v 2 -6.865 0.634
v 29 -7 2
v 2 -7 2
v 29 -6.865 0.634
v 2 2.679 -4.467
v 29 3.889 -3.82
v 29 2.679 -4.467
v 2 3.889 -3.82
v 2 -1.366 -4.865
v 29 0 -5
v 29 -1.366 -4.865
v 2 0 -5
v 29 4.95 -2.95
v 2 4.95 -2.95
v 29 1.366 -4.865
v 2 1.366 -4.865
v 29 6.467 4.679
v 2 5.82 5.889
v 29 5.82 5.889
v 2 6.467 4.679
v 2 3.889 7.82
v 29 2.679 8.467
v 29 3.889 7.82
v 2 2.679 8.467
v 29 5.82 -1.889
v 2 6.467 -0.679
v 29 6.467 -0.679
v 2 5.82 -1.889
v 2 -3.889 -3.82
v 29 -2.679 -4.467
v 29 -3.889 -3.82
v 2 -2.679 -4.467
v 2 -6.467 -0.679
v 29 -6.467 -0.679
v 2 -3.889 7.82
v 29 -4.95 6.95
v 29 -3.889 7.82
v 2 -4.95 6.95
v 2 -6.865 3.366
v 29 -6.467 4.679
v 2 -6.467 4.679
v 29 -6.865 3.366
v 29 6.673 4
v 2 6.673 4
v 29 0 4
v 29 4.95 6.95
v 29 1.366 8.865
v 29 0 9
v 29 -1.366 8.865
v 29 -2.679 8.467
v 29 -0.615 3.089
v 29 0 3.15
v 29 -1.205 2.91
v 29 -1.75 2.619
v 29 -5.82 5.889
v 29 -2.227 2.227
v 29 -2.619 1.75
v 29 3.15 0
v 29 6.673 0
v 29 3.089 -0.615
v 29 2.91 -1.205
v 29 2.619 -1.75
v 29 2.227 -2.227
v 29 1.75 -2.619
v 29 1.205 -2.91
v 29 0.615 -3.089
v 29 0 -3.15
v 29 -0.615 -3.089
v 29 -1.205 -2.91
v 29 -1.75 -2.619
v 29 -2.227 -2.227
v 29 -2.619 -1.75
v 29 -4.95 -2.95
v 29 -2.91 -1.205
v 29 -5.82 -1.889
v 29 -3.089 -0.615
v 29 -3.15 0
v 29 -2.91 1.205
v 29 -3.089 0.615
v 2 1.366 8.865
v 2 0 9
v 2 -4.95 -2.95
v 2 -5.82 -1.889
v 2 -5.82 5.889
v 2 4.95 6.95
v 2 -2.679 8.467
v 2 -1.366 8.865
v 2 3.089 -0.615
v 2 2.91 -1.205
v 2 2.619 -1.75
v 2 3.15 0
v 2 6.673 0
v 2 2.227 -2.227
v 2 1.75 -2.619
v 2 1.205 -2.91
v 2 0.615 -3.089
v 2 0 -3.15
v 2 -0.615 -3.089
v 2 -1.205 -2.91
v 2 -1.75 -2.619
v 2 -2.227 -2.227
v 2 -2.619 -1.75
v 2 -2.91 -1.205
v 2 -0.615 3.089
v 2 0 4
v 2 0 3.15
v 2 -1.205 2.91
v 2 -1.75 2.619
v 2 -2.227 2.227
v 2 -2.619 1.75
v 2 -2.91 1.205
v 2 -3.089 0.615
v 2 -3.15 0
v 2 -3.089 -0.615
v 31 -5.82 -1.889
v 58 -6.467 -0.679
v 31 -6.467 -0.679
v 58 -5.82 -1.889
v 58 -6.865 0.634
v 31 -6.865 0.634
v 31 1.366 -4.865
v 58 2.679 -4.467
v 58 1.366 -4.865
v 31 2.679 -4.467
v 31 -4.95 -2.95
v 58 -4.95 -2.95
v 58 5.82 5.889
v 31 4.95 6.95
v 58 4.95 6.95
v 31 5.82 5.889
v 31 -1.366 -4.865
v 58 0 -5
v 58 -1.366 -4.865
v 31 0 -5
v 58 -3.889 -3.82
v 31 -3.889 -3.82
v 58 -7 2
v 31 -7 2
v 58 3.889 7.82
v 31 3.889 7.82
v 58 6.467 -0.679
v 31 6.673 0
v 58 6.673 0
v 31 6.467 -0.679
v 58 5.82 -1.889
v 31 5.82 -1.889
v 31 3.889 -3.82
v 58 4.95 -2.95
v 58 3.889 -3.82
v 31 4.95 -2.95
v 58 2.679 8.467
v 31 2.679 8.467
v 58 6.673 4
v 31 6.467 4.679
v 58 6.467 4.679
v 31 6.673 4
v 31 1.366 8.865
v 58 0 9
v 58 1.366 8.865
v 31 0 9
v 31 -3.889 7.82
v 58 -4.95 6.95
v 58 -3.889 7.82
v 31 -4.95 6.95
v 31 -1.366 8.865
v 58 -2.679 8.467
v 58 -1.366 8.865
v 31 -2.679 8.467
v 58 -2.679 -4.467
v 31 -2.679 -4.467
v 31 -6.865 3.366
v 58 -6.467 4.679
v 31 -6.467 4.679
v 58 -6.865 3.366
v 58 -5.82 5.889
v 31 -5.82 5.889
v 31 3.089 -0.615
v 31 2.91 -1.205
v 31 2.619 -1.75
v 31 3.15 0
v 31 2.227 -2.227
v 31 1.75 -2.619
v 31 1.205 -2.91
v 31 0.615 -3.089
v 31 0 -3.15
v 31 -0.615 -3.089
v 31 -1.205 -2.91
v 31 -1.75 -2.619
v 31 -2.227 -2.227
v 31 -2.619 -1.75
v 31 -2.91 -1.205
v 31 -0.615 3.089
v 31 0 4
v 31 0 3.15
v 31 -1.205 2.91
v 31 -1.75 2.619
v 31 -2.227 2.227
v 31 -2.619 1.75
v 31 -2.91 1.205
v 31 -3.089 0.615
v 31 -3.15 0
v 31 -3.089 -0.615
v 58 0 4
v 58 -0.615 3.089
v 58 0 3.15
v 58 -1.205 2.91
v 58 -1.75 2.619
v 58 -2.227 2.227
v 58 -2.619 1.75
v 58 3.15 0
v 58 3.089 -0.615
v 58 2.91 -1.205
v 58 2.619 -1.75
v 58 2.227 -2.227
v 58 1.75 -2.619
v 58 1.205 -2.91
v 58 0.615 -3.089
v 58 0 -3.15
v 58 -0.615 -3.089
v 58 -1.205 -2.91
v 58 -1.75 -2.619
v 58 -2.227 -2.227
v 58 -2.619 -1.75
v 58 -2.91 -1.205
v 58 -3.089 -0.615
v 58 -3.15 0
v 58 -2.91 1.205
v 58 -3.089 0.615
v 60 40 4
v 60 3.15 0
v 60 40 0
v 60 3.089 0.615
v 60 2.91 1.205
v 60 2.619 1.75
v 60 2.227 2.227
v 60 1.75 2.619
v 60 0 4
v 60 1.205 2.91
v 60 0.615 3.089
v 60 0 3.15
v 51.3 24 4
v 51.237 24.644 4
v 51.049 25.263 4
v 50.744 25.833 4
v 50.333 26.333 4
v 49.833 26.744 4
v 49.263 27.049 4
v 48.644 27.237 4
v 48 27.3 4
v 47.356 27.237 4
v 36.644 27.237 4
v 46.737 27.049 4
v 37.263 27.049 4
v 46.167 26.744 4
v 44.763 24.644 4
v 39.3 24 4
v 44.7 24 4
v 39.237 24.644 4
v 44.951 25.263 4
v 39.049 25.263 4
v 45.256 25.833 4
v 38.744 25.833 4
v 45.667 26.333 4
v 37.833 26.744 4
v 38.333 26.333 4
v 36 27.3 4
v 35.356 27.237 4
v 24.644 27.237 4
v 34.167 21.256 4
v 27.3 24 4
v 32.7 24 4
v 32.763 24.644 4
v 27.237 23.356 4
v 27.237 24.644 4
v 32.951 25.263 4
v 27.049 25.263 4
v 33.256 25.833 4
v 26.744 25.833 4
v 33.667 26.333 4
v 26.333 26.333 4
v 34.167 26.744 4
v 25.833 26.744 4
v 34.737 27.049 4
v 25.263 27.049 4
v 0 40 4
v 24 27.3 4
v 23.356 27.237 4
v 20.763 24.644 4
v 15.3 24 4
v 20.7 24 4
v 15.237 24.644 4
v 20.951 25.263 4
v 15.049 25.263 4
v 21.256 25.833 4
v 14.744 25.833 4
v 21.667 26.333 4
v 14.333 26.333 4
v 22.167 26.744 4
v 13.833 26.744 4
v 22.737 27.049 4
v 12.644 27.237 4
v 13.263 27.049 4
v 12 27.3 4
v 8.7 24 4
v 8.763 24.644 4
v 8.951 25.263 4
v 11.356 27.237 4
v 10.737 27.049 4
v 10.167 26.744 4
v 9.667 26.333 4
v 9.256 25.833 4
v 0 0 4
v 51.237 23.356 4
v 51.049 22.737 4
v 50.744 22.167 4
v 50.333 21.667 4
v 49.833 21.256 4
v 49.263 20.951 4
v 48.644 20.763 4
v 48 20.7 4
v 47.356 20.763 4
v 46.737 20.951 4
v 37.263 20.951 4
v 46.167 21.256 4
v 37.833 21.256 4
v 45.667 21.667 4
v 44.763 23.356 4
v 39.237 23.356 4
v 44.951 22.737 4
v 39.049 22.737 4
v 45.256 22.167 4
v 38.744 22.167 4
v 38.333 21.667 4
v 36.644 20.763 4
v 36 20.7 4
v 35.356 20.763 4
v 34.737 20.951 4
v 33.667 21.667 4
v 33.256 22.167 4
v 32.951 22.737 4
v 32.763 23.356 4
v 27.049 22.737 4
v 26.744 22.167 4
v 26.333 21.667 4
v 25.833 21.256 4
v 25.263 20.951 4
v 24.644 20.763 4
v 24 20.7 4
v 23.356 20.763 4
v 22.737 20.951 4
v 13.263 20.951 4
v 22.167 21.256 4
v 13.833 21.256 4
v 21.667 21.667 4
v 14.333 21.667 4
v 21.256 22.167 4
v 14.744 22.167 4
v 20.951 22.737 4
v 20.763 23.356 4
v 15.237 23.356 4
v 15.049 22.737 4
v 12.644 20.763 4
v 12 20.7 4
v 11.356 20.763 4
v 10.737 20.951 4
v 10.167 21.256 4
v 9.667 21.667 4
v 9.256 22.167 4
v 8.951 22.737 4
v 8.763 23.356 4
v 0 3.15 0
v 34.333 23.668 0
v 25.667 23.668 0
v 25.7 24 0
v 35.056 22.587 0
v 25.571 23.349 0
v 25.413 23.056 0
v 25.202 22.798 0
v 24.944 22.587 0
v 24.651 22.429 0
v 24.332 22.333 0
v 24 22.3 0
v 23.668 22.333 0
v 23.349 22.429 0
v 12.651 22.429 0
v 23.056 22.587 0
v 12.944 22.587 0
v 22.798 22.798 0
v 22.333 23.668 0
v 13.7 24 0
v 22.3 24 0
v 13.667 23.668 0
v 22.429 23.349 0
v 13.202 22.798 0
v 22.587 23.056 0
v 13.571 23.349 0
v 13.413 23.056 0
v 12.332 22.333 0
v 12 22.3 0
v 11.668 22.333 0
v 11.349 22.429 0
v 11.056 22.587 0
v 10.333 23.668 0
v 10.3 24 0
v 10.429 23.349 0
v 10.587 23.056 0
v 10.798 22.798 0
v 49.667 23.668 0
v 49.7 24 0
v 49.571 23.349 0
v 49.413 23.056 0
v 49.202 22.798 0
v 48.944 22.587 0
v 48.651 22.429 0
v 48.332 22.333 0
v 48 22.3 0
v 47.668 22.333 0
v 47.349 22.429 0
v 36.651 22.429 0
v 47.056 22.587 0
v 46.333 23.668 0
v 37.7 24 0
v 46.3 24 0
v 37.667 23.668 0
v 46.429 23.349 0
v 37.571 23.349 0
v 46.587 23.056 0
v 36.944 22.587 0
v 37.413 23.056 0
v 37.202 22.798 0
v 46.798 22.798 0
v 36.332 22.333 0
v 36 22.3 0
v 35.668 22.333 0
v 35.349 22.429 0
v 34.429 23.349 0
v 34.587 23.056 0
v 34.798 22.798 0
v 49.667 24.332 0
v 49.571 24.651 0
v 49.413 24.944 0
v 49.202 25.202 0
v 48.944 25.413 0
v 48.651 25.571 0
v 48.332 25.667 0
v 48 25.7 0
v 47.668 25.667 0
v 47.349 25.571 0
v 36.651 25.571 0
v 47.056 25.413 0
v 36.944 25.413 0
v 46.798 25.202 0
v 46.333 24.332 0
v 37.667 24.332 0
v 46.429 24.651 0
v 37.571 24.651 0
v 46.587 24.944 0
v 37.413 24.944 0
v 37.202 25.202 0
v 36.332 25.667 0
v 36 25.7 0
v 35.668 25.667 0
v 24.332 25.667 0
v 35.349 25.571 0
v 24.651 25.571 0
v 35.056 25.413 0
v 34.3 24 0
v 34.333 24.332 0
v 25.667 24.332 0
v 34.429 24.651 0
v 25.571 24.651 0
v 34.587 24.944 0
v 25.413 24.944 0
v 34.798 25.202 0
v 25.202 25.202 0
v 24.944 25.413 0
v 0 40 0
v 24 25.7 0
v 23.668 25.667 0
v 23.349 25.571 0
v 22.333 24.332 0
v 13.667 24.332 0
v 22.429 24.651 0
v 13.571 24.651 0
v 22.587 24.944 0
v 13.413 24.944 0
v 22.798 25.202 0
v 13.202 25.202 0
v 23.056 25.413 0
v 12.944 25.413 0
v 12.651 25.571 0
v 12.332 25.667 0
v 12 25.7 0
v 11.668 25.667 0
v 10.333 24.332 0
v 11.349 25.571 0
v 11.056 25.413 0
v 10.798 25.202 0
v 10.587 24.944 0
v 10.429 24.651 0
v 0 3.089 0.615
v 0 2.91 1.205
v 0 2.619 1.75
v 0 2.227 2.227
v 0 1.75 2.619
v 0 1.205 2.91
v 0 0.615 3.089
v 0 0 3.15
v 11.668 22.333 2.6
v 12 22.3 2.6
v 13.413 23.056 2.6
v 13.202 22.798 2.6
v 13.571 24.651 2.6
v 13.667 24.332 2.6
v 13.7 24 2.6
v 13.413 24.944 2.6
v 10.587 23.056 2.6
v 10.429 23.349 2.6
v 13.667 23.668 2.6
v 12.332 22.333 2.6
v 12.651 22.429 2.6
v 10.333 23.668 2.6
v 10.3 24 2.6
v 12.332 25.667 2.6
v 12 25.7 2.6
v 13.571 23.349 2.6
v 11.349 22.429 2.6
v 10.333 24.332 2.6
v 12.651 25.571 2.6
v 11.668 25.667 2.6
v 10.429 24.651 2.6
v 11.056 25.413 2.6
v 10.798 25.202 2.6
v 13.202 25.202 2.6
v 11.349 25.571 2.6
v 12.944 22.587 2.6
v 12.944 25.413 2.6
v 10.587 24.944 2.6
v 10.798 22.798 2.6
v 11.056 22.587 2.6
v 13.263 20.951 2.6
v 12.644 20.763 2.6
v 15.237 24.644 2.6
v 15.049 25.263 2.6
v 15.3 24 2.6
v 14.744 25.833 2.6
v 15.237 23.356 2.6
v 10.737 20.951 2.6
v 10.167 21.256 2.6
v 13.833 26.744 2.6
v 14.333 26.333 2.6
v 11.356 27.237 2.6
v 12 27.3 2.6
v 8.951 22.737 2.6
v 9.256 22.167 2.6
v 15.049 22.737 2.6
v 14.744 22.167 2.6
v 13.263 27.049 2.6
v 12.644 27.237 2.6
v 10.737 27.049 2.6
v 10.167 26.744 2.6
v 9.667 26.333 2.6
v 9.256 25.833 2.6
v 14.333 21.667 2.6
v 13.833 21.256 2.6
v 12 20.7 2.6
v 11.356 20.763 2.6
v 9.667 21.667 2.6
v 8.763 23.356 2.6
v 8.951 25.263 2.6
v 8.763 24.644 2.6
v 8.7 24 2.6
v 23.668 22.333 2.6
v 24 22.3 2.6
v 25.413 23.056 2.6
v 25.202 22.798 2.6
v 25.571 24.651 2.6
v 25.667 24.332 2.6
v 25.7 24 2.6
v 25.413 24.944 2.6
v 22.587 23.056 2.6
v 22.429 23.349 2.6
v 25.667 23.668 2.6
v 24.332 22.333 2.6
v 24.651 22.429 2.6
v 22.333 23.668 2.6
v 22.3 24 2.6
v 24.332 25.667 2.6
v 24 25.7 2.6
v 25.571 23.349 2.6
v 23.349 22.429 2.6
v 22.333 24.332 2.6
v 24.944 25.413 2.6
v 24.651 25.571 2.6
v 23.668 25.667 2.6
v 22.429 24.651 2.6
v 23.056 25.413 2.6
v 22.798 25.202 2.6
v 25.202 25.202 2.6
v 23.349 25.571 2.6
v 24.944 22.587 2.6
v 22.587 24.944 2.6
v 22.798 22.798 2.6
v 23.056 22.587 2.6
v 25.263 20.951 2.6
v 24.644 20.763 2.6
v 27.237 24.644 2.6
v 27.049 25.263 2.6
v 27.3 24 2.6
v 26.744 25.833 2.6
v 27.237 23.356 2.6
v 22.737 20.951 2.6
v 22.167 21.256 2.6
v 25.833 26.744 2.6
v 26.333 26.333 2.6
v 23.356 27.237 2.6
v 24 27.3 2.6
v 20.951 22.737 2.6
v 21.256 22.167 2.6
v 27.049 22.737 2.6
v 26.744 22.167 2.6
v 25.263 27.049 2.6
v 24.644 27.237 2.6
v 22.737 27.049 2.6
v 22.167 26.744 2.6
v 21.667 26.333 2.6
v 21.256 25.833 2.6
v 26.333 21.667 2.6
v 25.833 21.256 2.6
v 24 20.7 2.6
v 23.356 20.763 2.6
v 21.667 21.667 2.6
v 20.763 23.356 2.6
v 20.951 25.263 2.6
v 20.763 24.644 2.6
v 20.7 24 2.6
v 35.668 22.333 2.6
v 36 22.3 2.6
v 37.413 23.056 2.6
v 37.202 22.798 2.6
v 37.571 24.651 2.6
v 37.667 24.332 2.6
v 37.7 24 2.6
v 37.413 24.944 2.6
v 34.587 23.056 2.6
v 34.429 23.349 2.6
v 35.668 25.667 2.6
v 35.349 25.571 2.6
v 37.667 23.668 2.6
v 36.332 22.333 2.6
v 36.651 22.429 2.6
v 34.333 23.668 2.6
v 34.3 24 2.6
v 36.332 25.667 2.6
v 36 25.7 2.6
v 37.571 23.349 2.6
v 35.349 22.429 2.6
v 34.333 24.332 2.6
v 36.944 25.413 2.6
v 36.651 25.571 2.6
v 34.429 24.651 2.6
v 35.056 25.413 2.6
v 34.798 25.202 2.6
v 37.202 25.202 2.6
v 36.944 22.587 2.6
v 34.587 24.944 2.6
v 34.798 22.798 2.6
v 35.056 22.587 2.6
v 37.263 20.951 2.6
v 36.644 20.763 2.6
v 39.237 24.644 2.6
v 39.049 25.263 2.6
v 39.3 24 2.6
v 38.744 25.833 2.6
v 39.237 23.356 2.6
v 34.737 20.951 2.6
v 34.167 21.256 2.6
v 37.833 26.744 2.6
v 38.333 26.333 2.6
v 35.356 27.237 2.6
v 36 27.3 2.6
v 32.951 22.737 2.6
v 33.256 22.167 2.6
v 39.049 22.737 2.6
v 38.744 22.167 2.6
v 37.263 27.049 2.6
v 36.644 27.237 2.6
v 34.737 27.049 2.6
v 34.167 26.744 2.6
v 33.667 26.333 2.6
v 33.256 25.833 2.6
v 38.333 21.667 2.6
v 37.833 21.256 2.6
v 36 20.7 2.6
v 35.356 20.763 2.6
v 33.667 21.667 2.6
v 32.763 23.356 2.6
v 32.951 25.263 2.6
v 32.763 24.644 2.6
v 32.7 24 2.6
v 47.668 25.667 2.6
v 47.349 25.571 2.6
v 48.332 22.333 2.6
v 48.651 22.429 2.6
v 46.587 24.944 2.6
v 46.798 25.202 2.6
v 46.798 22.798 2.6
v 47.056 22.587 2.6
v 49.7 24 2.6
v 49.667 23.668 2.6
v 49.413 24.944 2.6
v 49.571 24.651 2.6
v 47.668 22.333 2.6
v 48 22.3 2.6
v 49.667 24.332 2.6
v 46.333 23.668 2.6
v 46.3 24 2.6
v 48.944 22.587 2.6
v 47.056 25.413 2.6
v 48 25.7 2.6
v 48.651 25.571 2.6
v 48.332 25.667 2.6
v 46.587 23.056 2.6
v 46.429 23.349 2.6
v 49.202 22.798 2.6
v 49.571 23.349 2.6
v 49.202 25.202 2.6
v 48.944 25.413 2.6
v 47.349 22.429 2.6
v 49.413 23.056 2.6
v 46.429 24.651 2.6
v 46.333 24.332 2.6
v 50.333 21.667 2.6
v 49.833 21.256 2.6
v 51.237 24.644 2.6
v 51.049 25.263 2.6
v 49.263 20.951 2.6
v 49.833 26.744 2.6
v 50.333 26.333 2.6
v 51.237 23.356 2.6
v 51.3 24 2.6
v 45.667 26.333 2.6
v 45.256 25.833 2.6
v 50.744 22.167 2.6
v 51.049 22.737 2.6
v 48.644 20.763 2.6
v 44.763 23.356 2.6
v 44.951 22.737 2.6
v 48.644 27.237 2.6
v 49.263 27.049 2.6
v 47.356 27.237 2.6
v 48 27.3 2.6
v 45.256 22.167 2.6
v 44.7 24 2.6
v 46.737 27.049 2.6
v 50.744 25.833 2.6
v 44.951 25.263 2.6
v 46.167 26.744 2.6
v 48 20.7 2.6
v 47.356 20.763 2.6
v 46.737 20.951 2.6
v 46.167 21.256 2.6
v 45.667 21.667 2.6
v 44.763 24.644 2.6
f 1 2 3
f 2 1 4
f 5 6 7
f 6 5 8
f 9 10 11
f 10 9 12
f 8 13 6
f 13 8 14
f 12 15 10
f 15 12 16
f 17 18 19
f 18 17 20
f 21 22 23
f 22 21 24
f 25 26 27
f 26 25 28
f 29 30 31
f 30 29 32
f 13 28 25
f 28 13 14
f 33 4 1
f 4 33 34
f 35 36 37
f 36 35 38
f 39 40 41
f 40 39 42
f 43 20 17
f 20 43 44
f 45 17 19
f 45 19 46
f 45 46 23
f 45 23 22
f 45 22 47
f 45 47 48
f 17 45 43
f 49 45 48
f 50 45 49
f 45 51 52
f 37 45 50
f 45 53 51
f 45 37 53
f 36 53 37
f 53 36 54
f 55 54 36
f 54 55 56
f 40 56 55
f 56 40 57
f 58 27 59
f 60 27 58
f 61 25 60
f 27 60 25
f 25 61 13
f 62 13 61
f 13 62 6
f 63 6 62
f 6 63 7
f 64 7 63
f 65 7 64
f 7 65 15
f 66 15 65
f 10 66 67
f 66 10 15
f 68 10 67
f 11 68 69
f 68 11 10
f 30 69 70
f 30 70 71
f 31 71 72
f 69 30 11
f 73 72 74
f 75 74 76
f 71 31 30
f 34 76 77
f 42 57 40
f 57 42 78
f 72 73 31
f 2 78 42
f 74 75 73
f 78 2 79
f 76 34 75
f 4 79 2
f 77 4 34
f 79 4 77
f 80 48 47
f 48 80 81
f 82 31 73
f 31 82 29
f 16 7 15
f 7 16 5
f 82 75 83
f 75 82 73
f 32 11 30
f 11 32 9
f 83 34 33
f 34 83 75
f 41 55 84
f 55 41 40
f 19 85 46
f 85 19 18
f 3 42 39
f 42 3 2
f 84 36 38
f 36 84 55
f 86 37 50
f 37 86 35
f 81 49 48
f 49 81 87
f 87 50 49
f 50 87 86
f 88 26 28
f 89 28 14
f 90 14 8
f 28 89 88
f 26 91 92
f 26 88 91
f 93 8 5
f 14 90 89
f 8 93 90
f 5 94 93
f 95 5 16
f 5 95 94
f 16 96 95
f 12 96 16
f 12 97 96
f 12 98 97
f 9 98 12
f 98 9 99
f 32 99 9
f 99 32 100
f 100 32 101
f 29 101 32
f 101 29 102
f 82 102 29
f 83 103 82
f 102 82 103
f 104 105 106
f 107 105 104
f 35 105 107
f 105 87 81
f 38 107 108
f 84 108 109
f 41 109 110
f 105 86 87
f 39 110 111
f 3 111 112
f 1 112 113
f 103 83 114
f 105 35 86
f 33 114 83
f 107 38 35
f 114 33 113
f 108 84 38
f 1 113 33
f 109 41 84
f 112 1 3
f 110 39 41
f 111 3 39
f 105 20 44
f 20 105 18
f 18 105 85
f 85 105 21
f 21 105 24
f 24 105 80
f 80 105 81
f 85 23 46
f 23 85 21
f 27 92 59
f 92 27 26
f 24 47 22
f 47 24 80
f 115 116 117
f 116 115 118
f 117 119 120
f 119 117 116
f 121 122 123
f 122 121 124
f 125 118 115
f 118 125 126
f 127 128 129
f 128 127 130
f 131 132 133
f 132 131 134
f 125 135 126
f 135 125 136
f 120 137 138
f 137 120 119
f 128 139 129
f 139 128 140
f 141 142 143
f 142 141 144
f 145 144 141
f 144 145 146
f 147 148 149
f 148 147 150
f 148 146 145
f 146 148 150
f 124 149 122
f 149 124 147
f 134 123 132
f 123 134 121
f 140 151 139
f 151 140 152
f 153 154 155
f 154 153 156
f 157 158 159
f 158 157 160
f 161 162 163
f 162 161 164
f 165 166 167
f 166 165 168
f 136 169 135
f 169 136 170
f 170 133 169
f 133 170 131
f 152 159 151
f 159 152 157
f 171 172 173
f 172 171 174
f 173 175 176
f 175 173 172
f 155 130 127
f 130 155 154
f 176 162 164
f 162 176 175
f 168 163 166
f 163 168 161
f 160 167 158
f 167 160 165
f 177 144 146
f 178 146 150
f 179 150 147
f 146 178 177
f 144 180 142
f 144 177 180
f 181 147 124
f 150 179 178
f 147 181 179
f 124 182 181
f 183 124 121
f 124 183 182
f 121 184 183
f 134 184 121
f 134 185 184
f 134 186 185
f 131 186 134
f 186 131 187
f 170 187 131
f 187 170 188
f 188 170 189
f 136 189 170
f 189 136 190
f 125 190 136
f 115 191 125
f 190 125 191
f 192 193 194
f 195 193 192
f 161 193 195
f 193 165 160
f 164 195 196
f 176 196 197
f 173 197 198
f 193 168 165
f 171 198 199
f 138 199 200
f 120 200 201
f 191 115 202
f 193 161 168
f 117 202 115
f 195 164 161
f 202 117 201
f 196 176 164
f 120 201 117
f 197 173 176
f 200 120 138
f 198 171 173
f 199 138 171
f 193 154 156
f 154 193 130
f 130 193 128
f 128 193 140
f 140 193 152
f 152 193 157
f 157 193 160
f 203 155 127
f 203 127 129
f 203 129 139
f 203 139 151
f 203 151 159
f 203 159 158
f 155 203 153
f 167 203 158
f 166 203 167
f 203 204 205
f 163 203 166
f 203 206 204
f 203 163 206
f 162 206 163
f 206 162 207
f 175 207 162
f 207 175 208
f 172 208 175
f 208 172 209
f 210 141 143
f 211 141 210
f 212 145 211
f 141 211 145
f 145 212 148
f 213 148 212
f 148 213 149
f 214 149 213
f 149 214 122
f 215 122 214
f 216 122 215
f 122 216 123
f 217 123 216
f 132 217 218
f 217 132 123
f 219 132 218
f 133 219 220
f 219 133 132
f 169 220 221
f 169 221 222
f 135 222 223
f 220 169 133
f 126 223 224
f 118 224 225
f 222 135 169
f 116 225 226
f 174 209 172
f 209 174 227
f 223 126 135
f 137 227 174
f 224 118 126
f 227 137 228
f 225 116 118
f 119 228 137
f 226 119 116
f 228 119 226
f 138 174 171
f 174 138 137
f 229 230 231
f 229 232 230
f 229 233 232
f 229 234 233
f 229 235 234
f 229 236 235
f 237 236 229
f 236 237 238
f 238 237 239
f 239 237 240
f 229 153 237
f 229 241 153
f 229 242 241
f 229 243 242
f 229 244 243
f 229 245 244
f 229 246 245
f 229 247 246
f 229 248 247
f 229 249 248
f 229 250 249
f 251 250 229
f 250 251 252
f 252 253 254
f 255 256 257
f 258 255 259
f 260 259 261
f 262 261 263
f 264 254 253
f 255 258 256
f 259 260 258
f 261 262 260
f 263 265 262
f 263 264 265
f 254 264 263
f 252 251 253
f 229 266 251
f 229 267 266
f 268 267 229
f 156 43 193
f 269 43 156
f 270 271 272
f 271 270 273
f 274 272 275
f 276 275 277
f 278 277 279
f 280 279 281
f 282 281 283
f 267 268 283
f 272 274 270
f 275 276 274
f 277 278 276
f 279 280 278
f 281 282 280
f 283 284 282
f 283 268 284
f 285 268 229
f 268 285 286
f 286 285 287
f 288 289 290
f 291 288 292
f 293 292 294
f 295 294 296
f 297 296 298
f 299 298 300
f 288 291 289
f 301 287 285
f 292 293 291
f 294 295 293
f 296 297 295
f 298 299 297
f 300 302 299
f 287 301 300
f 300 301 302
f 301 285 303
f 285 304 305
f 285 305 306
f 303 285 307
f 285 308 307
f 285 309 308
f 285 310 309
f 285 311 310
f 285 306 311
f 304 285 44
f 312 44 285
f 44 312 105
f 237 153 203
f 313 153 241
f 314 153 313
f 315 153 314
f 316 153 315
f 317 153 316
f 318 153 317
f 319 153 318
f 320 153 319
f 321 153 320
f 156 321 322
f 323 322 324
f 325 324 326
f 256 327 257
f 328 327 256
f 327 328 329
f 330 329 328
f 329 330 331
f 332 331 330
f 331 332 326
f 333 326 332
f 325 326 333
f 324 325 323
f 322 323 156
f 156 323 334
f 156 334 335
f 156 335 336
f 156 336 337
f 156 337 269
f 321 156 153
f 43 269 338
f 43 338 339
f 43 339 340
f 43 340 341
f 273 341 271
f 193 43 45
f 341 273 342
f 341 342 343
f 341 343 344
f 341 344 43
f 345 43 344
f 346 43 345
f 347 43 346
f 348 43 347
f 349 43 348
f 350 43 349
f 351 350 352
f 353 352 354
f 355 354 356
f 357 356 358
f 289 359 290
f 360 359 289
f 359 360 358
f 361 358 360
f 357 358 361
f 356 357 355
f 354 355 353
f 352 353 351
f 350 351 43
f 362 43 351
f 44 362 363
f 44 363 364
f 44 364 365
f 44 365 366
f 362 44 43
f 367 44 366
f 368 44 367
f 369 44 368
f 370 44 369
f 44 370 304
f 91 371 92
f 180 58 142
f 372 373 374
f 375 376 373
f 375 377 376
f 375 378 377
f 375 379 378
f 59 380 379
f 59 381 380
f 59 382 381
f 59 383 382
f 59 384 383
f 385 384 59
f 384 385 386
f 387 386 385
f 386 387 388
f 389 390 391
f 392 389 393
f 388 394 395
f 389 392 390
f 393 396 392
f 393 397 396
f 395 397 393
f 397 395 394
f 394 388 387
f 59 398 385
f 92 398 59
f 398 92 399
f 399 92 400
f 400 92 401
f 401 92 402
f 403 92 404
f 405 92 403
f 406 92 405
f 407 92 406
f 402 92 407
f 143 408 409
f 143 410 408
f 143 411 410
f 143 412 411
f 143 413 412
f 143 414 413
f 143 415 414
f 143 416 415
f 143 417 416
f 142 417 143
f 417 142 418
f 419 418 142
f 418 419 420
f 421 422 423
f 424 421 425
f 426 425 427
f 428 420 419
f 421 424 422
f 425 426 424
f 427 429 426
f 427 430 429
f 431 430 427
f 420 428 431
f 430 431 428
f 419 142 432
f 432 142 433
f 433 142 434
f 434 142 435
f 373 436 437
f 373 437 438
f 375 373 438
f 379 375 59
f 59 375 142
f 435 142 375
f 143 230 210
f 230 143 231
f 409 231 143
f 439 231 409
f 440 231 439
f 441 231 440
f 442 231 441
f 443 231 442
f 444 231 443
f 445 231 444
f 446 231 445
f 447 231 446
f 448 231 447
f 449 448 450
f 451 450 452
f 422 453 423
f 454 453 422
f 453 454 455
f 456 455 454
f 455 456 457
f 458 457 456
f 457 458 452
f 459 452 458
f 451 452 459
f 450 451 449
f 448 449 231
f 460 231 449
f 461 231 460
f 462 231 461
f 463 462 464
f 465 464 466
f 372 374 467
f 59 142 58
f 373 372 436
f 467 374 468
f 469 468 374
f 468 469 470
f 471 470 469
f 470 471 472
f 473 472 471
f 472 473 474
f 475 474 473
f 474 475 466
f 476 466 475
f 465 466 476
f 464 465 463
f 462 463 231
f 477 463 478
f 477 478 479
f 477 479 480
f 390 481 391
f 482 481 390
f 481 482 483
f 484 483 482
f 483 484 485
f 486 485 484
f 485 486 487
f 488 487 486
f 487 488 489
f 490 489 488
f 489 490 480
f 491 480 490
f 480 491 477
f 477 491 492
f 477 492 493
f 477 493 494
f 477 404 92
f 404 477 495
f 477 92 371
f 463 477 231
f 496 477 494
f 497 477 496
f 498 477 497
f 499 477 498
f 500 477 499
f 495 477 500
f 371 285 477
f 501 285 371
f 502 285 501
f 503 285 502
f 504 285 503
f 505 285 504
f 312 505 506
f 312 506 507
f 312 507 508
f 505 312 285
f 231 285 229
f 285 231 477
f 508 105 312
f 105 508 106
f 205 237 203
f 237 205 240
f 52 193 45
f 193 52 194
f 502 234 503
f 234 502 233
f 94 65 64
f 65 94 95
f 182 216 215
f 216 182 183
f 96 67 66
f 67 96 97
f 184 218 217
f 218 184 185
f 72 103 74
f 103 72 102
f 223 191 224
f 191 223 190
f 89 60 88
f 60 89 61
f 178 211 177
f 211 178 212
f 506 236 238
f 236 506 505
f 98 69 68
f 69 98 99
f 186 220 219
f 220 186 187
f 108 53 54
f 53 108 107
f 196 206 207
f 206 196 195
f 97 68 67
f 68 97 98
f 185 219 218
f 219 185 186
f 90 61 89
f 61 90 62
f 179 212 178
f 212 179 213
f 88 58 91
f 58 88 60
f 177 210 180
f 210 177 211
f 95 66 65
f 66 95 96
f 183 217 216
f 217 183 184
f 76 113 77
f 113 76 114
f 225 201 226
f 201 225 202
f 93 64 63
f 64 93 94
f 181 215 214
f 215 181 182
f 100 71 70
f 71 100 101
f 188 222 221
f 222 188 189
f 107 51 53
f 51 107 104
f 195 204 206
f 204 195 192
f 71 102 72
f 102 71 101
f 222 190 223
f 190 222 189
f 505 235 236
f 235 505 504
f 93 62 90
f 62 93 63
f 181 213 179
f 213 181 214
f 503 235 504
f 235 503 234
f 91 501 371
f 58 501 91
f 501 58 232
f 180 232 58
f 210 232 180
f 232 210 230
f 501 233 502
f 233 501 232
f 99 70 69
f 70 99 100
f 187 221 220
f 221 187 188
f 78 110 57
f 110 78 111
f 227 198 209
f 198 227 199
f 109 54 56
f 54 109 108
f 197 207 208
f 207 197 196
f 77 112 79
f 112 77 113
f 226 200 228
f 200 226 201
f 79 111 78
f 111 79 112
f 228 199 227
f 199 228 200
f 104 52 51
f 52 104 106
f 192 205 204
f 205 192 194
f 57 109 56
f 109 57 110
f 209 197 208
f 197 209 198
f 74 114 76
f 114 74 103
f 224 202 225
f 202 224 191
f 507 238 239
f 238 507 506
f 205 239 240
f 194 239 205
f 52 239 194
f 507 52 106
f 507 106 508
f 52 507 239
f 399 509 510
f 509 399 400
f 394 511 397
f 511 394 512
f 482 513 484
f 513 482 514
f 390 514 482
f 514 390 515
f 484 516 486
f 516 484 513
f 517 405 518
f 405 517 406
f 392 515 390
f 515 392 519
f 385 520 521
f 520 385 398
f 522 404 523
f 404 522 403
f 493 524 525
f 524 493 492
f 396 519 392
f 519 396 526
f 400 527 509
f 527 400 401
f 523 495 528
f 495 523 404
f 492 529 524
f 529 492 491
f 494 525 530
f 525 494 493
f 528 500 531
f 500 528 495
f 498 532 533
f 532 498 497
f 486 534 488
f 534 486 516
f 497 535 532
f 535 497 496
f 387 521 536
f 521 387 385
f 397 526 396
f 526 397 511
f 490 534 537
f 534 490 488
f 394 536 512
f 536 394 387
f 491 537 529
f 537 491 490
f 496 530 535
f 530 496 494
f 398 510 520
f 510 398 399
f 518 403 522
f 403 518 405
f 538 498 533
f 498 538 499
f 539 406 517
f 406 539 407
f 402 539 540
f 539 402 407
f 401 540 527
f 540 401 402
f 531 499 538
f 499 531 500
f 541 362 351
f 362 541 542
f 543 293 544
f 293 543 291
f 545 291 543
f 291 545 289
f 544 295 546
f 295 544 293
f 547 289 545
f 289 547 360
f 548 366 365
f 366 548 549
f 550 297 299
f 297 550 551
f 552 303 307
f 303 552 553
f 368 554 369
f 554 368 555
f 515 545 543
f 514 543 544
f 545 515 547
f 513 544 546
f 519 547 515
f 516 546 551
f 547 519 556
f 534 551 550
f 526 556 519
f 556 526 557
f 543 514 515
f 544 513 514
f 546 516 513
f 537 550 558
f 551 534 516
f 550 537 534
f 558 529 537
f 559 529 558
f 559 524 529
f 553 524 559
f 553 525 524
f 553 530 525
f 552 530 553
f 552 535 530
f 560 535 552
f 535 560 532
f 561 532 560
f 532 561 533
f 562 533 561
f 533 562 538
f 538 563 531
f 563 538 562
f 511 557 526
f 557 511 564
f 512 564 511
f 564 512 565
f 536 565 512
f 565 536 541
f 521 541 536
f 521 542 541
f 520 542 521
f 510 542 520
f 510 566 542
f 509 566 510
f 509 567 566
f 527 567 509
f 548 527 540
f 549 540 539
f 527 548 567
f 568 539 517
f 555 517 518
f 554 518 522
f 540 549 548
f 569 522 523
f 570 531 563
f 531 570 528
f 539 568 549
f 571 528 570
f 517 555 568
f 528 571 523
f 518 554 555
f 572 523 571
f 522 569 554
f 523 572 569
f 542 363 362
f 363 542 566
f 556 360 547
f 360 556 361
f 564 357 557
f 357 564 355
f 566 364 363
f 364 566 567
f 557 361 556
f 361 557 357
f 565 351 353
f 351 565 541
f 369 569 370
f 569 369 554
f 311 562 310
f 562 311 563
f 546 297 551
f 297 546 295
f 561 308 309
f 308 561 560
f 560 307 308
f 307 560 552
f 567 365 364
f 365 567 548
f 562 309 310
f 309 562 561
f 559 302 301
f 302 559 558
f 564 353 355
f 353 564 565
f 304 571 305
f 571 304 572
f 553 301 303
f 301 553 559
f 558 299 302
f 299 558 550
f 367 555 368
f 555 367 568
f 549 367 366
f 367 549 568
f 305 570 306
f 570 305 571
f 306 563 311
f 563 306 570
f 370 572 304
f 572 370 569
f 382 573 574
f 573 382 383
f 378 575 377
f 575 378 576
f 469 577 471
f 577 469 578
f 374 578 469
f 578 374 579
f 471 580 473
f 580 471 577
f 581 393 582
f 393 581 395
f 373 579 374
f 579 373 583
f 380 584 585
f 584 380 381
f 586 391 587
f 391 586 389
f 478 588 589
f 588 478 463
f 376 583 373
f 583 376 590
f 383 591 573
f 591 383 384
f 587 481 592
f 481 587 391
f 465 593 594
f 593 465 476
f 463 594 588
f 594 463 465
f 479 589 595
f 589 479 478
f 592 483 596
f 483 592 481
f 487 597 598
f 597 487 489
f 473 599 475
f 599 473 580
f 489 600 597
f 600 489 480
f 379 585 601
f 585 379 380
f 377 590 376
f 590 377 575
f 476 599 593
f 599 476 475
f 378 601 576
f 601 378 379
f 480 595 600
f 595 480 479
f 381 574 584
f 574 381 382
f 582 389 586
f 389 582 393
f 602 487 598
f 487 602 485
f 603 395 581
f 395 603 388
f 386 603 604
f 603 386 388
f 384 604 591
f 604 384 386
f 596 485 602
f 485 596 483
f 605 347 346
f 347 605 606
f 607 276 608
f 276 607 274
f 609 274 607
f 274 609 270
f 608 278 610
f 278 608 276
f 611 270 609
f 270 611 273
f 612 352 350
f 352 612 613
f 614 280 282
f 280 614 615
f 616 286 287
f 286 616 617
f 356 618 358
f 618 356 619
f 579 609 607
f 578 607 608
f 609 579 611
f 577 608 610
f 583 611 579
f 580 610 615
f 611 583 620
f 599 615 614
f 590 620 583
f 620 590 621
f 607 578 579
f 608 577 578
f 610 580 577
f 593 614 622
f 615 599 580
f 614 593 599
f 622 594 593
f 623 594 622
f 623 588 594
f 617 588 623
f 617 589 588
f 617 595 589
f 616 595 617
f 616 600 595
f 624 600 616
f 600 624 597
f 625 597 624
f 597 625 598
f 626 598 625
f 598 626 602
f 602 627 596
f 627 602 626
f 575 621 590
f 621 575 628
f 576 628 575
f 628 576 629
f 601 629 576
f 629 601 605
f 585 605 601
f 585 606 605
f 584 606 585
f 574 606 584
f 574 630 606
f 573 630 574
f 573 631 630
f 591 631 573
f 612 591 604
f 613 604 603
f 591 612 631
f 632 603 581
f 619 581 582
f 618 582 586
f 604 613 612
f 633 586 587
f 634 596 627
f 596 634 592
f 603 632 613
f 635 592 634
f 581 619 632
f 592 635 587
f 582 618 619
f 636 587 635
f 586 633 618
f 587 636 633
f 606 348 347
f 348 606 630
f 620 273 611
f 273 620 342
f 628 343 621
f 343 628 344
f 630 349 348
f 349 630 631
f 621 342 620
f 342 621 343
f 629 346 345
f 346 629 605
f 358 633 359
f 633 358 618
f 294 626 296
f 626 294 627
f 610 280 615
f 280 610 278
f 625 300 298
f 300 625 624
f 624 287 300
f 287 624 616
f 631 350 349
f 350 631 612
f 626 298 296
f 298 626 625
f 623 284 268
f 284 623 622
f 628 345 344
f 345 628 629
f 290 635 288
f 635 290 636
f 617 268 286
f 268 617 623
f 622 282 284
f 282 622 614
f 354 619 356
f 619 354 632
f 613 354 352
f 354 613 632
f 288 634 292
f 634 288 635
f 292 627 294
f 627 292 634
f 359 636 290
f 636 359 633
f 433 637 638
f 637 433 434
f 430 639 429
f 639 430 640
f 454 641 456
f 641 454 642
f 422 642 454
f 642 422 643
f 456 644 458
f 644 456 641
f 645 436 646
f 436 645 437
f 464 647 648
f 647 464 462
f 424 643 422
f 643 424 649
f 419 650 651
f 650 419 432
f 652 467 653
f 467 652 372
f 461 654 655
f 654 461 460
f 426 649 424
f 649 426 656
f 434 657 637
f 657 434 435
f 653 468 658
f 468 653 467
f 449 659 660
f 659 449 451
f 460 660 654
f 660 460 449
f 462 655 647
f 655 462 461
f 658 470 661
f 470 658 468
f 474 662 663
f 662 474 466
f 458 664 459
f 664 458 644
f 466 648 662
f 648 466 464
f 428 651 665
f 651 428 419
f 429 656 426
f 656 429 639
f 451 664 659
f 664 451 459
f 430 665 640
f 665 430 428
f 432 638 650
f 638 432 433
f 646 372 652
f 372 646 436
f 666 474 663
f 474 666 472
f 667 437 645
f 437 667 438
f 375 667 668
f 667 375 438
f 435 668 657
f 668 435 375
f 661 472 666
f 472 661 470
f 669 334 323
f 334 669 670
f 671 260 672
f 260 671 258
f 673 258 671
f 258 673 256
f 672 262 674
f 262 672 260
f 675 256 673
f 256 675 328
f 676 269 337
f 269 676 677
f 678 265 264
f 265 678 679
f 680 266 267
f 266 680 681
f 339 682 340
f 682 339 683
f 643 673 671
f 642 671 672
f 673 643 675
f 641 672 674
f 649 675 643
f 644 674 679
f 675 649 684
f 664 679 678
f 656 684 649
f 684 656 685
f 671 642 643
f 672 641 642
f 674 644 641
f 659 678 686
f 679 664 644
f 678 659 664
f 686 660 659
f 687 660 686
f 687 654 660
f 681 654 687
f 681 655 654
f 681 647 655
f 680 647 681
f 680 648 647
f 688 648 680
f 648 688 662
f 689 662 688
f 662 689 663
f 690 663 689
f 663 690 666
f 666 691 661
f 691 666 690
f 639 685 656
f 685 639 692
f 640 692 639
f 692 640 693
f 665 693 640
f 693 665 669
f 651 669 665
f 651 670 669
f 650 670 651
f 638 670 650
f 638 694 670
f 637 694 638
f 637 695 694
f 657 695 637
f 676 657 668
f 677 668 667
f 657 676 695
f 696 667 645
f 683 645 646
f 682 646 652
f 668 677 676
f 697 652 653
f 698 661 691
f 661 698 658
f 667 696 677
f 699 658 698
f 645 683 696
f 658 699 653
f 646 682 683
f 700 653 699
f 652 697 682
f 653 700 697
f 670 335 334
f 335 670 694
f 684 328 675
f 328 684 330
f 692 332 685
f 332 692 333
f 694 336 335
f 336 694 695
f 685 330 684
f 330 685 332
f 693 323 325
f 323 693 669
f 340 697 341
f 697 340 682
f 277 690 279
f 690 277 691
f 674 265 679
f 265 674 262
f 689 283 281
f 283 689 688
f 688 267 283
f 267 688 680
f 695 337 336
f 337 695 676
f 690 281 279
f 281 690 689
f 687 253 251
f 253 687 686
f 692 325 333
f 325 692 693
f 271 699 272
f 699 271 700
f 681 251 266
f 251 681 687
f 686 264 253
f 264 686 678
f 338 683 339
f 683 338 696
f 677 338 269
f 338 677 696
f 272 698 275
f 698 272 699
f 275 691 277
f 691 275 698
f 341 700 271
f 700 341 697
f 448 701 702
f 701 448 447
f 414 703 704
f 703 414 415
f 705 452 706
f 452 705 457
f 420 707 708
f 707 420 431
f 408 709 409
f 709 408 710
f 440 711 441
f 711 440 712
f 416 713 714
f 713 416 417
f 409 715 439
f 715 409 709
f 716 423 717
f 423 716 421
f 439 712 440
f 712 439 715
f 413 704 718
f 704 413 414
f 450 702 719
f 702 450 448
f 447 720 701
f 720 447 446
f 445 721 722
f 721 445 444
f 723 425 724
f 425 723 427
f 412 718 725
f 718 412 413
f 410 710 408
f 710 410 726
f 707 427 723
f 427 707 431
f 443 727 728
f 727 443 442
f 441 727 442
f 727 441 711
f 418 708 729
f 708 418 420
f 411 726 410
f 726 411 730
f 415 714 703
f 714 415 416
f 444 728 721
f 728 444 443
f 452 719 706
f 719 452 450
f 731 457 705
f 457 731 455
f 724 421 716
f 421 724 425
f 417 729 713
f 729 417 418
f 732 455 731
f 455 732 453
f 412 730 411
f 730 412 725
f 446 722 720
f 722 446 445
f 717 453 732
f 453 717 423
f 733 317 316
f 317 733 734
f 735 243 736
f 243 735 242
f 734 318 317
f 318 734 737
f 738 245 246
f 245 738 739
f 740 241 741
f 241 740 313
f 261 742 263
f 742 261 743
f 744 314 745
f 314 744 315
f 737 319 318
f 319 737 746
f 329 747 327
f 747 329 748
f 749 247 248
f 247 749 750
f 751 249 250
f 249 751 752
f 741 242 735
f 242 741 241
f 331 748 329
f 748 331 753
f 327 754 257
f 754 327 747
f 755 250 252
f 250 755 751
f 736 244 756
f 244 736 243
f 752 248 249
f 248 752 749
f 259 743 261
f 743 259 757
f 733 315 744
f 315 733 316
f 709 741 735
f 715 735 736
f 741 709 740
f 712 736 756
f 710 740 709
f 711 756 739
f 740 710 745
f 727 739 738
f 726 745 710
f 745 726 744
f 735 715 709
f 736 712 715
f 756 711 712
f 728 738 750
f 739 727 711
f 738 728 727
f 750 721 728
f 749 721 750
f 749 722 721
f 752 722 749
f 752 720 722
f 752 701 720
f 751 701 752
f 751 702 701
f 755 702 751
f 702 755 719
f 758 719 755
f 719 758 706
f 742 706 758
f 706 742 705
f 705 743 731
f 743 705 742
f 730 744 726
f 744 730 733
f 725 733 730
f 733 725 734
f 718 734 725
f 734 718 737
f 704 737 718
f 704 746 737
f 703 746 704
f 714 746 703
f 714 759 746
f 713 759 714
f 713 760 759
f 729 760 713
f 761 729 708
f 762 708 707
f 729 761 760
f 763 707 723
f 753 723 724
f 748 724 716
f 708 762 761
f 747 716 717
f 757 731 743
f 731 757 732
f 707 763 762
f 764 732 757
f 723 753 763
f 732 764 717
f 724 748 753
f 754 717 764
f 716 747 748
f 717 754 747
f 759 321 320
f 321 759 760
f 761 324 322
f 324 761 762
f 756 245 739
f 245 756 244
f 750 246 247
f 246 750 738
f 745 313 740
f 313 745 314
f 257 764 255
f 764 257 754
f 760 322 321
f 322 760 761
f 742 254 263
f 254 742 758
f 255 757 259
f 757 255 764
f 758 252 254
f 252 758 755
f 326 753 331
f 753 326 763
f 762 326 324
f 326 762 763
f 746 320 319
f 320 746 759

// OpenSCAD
$fn = 32;

// ----------------------------------------------------------------------
// Hinge leaf: 60 x 47 x 14 mm
// ----------------------------------------------------------------------

// --- parameters (mm) ---
tab_len = 60;             // leaf length, X
tab_w = 40;               // leaf width, Y
tab_t = 4;                // leaf thickness
ring_d = 14;              // knuckle diameter
ring_w = 27;              // knuckle width
knuckle_n = 2;            // number of knuckles
pin_d = 6.3;              // pin bore
gap = 2;                  // gap between the knuckles
screw_d = 3.4;            // screw clearance
cs_d = 6.6;               // countersink diameter
cs_h = 1.4;               // countersink depth

module leaf() {
  cube([tab_len, tab_w, tab_t]);
}

module knuckles() {
  /* barrels sit on the leaf edge, the pin axis at half the leaf thickness */
  for (i = [0 : knuckle_n - 1])
    translate([gap + i * (ring_w + gap), 0, tab_t * 0.5])
      rotate([0, 90, 0]) cylinder(h = ring_w, d = ring_d);
}

difference() {
  union() {
    leaf();
    knuckles();
  }
  rotate([0, 90, 0]) translate([0, 0, -1])
    cylinder(h = tab_len + 2, d = pin_d);
  translate([12, tab_w * 0.6, -1]) cylinder(h = tab_t + 2, d = screw_d);
  translate([12, tab_w * 0.6, tab_t - cs_h]) cylinder(h = cs_h + 0.5, d = cs_d);
  translate([24, tab_w * 0.6, -1]) cylinder(h = tab_t + 2, d = screw_d);
  translate([24, tab_w * 0.6, tab_t - cs_h]) cylinder(h = cs_h + 0.5, d = cs_d);
  translate([36, tab_w * 0.6, -1]) cylinder(h = tab_t + 2, d = screw_d);
  translate([36, tab_w * 0.6, tab_t - cs_h]) cylinder(h = cs_h + 0.5, d = cs_d);
  translate([48, tab_w * 0.6, -1]) cylinder(h = tab_t + 2, d = screw_d);
  translate([48, tab_w * 0.6, tab_t - cs_h]) cylinder(h = cs_h + 0.5, d = cs_d);
}
